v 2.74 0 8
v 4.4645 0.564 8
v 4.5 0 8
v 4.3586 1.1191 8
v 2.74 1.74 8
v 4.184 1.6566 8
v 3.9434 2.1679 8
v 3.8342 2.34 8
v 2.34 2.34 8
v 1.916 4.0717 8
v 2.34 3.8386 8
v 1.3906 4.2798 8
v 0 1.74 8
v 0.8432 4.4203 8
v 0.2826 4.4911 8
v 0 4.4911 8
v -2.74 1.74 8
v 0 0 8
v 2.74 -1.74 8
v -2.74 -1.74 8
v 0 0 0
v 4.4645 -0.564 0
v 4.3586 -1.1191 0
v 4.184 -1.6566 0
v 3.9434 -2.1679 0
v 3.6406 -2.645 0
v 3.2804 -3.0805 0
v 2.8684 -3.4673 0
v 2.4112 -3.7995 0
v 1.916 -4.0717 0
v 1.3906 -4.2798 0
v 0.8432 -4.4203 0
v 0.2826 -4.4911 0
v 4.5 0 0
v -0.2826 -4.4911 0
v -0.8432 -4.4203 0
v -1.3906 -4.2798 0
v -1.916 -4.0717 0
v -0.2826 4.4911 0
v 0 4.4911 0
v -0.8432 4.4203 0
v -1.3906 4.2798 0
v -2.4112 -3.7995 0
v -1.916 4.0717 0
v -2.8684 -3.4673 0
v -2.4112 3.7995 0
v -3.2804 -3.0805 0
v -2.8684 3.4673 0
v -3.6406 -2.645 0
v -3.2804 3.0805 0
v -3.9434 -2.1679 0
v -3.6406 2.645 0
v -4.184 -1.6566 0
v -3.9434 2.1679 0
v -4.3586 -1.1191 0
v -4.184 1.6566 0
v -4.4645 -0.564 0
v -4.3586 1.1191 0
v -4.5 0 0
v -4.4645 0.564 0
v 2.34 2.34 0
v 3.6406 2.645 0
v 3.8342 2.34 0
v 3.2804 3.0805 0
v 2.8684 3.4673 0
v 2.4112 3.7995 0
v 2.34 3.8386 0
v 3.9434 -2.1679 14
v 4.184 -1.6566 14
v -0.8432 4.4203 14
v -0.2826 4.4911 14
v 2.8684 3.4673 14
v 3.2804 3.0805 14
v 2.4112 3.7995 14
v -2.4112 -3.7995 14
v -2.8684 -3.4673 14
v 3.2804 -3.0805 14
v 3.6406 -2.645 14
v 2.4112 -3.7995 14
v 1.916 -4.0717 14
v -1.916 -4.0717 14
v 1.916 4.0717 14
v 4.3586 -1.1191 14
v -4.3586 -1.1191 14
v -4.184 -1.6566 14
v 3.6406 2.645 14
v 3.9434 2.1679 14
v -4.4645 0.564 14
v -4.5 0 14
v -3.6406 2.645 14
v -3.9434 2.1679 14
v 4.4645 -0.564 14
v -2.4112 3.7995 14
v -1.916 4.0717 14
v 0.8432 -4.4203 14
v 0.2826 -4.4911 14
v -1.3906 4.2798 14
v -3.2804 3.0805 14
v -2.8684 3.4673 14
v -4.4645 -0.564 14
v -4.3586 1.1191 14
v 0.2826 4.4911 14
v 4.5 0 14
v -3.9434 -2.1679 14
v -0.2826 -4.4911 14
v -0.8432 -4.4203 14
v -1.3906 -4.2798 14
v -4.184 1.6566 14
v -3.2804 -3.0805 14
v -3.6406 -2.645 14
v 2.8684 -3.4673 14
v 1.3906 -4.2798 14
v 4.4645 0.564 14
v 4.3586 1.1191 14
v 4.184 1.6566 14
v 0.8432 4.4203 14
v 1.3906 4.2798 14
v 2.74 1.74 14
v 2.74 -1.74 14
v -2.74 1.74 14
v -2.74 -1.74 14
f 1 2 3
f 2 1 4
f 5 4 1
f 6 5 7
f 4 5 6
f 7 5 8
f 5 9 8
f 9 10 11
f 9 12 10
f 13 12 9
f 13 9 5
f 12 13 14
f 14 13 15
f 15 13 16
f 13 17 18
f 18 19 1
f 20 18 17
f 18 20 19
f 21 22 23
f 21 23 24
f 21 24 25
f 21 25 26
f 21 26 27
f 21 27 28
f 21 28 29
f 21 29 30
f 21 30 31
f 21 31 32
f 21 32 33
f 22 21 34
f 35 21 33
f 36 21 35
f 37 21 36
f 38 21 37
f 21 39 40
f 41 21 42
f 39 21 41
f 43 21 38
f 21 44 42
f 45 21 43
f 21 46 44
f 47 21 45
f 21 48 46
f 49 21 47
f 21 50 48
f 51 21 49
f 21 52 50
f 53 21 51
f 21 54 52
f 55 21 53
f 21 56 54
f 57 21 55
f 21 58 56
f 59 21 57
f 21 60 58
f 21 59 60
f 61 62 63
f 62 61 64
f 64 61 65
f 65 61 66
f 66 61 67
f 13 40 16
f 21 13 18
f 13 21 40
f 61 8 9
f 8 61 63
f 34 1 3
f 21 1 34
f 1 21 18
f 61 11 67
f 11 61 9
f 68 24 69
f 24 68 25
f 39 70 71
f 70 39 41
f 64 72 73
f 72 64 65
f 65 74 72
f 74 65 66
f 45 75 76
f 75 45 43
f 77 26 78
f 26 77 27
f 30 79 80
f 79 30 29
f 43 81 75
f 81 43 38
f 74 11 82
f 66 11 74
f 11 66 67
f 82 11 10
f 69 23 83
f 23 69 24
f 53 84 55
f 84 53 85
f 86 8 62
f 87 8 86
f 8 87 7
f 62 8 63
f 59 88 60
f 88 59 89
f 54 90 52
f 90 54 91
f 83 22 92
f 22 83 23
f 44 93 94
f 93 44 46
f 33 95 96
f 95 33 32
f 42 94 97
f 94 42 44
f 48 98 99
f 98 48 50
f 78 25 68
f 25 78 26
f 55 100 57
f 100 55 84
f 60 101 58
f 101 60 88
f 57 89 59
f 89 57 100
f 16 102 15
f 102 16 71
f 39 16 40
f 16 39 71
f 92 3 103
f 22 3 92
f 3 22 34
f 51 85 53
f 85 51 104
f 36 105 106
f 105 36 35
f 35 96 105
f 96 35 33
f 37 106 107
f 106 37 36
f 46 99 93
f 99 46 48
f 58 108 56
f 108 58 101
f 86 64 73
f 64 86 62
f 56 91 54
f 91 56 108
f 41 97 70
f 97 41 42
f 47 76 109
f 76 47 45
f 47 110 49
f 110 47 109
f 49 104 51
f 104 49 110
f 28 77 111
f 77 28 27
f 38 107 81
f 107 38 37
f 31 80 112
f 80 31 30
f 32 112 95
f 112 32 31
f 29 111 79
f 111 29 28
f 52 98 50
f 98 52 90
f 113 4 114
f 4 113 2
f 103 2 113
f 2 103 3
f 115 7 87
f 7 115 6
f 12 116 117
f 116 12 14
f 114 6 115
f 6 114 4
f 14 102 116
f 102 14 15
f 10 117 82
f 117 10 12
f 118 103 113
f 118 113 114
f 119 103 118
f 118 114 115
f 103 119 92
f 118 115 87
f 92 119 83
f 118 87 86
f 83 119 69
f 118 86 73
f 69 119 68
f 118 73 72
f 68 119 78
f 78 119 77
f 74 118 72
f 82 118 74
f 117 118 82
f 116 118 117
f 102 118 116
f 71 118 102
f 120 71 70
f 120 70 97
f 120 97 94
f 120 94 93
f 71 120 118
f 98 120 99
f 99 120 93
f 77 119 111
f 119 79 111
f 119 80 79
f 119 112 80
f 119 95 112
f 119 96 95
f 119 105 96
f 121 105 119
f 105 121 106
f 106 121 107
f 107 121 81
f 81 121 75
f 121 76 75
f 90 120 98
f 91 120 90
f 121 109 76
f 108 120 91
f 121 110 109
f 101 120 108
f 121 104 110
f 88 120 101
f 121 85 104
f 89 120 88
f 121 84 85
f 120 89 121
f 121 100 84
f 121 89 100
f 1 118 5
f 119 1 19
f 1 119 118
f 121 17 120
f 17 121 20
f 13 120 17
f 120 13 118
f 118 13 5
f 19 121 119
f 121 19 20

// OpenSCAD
module tube (length, diameter, x, y, z){
 translate([x,y,z]){
    cylinder(length, r=diameter/2);
 }    
}

module box (xlength, ylength, zlength, x, y, z){
    dx = xlength/2;
    dy = ylength/2;
    dz = zlength/2;
    translate([x-dx,y-dy,z]){
        cube ([xlength,ylength,zlength]);
    }
}

$fn=50; // rurve

final = true;
cross_test = true;
axil_test = true;

radius = 9;
axil=8;
motor=6;

axis_wcross = 5.34; //width of cross
axis_wbeam = 2.34; // with of a small crossbeam that builds the cross

motor_width = 5.48;
motor_length = 3.48;

test_hight = 2;

module cross (wcross,wbeam,x,y,z) {
    box (wcross,wbeam,z,x,y);
    box (wbeam,wcross,z,x,y);
}


if (!final) {
    
    // CREATE THE AXIS CONNECTOR
    if (axil_test){
        difference(){
            tube(test_hight, radius, 0, 0, 0);
            cross(axis_wcross,axis_wbeam,0,0,axil);
        }
    }

    // CREATE MOTOR CONNECTOR
    if (cross_test) {

        translate([radius + 1,0,-axil]){
            difference(){
                tube(test_hight, radius, 0, 0, axil);
                box (motor_width,motor_length,motor,0,0,axil);
            }
        }
    }    
}    

if (final) { 
    // CREATE THE AXIS CONNECTOR
    difference(){
        tube(axil, radius, 0, 0, 0);
        cross(axis_wcross,axis_wbeam,0,0,axil);
    }

    // CREATE MOTOR CONNECTOR
    difference(){
        tube(motor, radius, 0, 0, axil);
        box (motor_width,motor_length,motor,0,0,axil);
    }
}
